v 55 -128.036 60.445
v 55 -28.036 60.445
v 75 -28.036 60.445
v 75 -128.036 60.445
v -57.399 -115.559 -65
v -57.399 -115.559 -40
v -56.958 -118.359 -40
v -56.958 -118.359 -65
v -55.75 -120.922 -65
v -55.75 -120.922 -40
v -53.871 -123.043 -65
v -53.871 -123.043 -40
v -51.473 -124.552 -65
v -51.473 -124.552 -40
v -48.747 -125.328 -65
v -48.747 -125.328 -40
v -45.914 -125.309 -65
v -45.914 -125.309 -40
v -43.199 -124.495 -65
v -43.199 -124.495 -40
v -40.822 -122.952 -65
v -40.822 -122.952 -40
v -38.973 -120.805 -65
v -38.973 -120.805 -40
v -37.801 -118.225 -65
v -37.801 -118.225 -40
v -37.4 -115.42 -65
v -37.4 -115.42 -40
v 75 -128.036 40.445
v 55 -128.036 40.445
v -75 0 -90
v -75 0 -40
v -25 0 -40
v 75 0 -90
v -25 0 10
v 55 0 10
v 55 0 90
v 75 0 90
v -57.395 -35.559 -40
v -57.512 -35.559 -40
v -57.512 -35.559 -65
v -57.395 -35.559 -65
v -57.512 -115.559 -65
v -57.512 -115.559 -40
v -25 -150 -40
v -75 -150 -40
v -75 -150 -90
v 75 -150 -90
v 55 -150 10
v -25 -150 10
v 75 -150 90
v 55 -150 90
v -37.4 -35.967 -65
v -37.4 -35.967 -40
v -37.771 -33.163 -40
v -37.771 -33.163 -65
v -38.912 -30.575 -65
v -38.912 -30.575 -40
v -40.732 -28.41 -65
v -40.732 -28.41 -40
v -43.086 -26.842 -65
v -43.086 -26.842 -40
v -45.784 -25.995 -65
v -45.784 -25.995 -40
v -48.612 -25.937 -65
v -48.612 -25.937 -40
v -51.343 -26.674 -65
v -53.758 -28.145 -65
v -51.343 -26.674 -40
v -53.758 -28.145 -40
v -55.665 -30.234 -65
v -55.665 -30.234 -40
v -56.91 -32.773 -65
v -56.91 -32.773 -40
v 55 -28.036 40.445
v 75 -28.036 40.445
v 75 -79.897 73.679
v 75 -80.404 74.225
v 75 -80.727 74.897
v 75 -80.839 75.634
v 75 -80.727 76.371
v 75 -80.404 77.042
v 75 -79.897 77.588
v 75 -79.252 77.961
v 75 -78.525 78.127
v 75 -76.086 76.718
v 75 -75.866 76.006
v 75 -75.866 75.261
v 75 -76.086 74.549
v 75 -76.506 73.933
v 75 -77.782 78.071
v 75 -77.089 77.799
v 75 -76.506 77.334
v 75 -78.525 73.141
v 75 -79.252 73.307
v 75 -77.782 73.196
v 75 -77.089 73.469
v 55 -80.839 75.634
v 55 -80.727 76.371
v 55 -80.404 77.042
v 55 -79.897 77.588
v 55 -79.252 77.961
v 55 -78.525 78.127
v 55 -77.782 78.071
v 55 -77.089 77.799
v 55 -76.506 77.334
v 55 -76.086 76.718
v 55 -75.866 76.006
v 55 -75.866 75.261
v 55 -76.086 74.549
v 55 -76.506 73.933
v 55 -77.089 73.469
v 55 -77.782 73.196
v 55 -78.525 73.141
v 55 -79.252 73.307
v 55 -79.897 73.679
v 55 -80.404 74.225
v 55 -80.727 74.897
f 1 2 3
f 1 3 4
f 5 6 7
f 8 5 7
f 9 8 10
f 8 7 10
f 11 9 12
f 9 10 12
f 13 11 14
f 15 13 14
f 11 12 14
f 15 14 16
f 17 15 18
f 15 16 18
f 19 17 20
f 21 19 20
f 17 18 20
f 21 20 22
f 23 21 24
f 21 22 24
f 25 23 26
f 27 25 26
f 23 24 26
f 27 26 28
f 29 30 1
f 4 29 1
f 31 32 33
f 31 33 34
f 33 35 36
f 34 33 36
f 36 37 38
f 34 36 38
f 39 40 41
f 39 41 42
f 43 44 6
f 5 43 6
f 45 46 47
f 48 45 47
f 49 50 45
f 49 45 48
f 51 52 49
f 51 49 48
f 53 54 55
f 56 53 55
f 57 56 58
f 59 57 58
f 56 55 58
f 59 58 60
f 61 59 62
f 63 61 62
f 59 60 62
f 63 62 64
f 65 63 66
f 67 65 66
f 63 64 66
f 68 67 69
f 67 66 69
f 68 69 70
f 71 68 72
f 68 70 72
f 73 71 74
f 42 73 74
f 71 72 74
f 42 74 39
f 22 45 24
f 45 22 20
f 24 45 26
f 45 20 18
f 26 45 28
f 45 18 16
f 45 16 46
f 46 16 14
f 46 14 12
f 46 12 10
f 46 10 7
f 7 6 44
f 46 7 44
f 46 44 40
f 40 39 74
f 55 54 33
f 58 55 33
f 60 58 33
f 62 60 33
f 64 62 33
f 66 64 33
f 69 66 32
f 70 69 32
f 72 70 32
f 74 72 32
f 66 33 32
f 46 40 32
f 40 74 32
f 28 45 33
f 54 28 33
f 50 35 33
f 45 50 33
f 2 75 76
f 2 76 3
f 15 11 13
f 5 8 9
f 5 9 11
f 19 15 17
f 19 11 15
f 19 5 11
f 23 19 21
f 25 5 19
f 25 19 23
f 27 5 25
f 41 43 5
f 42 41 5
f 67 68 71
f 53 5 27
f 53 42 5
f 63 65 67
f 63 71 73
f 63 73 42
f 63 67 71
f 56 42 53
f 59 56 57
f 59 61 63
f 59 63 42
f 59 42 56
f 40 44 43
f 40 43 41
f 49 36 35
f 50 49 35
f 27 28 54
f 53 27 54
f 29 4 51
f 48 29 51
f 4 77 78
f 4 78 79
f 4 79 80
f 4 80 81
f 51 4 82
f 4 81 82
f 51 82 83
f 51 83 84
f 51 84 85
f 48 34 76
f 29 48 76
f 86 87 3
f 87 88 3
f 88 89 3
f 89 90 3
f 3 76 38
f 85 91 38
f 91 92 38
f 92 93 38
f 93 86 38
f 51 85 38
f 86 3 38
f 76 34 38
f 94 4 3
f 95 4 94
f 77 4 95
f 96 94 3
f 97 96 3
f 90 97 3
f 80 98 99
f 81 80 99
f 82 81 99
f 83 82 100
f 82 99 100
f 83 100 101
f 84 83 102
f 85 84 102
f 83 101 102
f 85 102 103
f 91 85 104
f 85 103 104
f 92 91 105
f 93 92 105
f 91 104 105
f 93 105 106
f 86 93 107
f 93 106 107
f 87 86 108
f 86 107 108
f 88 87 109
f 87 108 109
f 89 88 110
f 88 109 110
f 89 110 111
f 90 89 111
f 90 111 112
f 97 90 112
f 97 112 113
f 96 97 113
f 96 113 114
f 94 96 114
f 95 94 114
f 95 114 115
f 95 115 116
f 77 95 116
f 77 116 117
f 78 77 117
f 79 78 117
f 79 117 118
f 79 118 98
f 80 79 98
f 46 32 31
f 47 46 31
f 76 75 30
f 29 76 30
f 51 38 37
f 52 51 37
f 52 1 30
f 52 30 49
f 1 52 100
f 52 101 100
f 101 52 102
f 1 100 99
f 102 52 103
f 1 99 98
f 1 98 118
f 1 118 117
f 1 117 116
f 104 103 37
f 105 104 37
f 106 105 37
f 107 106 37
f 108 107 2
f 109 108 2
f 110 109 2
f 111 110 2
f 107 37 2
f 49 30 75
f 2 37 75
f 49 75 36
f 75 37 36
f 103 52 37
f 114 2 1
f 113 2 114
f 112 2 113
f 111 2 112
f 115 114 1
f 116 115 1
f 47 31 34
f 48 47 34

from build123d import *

# Parameters (mm, degrees)
F1_DEPTH = 150
F2_W     = 100
F2_H     = 20
F3_DEPTH = 20.001
F4_W     = 20
F4_H     = 80
F6_DEPTH = 25
F7_DEPTH = 25
F8_R     = 2.5
F9_DEPTH = 20.001


with BuildPart() as f1:
    # F0 (on Front) → F1 (new body)
    with BuildSketch(Plane.XZ):
        Polygon((75, -90), (75, 90), (55, 90), (55, 10), (-25, 10), (-25, -40), (-75, -40), (-75, -90), align=None)
    extrude(amount=F1_DEPTH)

    # F2 (on face) → F3 (cut, through all)
    with BuildSketch(Plane(origin=(55, 0, 0), x_dir=(0, -1, 0), z_dir=(-1, 0, 0))):
        with Locations((78.036222, 50.444517)):
            Rectangle(F2_W, F2_H)
    extrude(amount=-F3_DEPTH, mode=Mode.SUBTRACT)

    # F4 (on face) → F6 (cut)
    with BuildSketch(Plane.XY.offset(-40)):
        with Locations((-47.512008, -75.5594)):
            Rectangle(F4_W, F4_H)
    extrude(amount=-F6_DEPTH, mode=Mode.SUBTRACT)

    # F5 (on face) → F7 (cut)
    with BuildSketch(Plane.XY.offset(-40)):
        with BuildLine():
            Line((-37.399707, -115.419537), (-37.400242, -35.966876))
            ThreePointArc((-37.400242, -35.966876), (-47.195959, -25.865494), (-57.395084, -35.5594))
            Line((-57.395084, -35.5594), (-37.512008, -35.5594))
            Line((-37.512008, -35.5594), (-37.512008, -115.5594))
            Line((-37.512008, -115.5594), (-57.398729, -115.5594))
            ThreePointArc((-57.398729, -115.5594), (-47.329774, -125.419292), (-37.399707, -115.419537))
        make_face()
    extrude(amount=-F7_DEPTH, mode=Mode.SUBTRACT)

    # F8 (on face) → F9 (cut, through all)
    with BuildSketch(Plane(origin=(55, 0, 0), x_dir=(0, -1, 0), z_dir=(-1, 0, 0))):
        with Locations((78.338511, 75.63369)):
            Circle(F8_R)
    extrude(amount=-F9_DEPTH, mode=Mode.SUBTRACT)


solid = f1.part
